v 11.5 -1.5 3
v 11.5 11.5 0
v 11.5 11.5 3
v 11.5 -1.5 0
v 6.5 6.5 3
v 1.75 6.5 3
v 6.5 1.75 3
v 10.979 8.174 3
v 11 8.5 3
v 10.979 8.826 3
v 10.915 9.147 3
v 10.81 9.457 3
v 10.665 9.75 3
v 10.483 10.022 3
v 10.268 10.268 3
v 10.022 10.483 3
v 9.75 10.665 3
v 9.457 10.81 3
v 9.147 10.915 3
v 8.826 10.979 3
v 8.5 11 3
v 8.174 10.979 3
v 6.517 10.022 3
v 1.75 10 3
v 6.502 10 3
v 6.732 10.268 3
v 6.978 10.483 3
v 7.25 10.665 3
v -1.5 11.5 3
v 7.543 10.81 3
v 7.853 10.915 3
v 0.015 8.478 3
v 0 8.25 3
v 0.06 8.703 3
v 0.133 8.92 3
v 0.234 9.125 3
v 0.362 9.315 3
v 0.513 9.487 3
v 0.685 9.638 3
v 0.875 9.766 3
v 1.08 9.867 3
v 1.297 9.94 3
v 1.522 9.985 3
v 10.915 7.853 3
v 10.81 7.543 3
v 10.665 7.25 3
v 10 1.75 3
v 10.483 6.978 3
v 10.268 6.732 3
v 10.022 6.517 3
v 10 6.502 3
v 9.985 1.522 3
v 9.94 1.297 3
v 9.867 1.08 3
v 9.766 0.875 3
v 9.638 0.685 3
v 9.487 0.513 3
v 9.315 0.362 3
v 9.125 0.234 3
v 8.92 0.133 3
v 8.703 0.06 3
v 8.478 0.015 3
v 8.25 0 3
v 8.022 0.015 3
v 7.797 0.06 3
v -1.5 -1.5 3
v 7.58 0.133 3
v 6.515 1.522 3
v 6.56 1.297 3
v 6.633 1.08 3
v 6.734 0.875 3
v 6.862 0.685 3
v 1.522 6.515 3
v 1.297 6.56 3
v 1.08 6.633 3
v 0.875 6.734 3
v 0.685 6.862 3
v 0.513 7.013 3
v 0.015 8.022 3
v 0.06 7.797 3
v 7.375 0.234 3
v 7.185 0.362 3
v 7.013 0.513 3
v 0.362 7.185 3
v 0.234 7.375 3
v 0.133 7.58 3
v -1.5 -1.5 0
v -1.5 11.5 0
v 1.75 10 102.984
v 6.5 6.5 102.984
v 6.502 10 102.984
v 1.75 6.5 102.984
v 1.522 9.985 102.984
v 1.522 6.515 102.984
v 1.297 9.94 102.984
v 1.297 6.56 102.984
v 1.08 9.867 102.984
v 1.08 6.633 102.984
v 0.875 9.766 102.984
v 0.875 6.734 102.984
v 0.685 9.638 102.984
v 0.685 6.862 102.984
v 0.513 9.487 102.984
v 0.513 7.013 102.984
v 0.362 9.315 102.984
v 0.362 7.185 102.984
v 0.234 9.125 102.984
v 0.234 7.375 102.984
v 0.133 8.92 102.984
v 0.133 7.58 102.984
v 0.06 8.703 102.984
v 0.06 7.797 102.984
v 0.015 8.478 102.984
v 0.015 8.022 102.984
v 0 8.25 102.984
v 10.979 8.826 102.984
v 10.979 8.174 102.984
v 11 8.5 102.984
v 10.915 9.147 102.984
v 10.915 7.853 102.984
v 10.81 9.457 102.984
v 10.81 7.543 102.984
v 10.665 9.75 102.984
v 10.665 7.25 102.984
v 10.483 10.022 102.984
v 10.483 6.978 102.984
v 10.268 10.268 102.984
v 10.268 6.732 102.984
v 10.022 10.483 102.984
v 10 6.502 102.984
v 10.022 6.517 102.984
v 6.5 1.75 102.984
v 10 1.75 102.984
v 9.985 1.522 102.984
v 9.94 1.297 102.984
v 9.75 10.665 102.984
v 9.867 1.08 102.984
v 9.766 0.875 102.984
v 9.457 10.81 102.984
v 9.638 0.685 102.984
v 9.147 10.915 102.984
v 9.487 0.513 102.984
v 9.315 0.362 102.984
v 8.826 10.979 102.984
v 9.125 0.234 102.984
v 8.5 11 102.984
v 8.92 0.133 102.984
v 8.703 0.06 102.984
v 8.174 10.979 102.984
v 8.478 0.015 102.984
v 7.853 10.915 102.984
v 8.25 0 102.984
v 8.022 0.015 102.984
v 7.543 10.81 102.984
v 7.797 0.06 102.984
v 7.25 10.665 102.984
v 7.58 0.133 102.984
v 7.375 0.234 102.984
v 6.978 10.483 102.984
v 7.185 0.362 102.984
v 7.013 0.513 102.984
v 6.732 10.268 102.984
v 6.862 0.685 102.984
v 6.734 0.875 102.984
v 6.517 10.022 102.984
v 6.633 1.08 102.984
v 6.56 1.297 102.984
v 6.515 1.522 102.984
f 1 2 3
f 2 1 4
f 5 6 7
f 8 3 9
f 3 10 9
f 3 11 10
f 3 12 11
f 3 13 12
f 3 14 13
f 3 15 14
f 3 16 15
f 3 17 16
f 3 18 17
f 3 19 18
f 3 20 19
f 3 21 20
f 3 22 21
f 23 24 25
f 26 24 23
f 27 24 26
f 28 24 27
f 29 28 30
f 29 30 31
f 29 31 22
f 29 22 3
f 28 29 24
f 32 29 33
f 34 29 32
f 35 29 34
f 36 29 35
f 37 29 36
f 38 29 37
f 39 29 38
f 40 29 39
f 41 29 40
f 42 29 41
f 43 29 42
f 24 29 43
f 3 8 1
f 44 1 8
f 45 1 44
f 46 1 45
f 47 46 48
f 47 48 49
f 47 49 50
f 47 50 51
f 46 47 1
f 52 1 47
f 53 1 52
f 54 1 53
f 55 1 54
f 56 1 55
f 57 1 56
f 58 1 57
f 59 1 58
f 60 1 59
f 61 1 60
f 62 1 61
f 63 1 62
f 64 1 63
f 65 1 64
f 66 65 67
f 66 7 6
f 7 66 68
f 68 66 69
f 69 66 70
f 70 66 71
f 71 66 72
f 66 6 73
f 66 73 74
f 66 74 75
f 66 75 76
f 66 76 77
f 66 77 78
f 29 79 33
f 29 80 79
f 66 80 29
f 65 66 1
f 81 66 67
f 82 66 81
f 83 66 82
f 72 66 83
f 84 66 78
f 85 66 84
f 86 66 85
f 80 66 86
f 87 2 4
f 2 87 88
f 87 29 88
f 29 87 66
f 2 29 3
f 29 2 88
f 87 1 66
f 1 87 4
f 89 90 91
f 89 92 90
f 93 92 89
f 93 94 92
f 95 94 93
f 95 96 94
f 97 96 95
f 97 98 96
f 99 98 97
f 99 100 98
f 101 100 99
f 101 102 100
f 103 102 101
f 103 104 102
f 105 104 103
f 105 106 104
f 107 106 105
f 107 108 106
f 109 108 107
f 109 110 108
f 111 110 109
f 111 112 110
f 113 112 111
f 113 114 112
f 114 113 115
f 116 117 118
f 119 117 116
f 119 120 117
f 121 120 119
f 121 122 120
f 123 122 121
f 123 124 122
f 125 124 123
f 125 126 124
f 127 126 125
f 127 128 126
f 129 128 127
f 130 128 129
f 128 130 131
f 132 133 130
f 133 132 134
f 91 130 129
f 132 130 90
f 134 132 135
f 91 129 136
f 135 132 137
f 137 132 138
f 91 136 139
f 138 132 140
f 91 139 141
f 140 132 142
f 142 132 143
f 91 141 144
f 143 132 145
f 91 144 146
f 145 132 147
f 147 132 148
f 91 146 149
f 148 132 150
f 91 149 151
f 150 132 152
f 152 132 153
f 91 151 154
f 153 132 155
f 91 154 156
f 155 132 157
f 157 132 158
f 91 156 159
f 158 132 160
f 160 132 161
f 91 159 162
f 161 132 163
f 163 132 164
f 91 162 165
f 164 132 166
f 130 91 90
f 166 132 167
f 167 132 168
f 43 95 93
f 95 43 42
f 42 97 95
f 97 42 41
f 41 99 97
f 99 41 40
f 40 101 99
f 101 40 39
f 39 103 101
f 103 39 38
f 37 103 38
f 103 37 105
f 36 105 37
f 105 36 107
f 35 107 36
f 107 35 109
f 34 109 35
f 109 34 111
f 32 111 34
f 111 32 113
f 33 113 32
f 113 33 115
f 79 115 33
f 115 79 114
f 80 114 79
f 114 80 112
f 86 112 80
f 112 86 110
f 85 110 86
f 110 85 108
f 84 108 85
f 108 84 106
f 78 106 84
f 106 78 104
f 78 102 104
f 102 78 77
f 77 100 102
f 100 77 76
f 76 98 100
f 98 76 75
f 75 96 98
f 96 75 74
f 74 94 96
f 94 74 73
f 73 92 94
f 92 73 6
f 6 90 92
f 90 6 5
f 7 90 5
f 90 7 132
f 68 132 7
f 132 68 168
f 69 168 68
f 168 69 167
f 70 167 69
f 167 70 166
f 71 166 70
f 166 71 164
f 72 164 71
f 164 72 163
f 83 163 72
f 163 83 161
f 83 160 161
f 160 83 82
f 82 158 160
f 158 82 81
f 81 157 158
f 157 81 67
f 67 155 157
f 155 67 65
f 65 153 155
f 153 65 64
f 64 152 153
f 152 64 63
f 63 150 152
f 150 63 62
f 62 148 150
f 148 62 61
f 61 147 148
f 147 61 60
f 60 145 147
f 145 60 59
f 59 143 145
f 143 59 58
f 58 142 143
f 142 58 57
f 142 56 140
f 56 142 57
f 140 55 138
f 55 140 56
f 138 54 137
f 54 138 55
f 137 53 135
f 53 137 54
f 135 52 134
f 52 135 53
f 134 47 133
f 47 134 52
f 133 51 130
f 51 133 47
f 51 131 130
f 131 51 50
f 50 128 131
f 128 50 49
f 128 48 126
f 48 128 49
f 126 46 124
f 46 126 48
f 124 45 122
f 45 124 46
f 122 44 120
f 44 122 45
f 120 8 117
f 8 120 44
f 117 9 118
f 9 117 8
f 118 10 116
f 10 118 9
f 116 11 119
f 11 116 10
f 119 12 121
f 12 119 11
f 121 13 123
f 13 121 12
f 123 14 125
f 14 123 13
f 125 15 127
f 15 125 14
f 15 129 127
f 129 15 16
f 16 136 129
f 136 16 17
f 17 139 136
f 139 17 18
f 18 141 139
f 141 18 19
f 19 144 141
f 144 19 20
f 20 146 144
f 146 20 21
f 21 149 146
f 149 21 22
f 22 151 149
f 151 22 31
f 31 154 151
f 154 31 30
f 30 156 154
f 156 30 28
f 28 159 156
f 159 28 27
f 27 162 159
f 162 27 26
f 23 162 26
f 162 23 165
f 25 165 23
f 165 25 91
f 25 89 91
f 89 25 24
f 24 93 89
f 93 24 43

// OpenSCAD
e = 1/64;

slot_width = 4.0;
L_leg_length = 11; // possibly 12
extent_length = 14.0;

center_diameter = 8.5;


module ridge_outline () {

  both_inset = 0.5;
  inset = both_inset / 2;
  ridge_width = slot_width - 0.5;
  half_ridge_width = ridge_width / 2;

  L_vert_to_horiz_start = 6.5; // measured is 7.0

  ridge_center_radius = 5.0 / 2;

  rotate([0, 0, 180])
  union () {
    square([ridge_width, L_vert_to_horiz_start + half_ridge_width]);
    translate([half_ridge_width, L_vert_to_horiz_start + half_ridge_width]) {
      circle(d = ridge_width, $fn = 48);
    }

    square([L_vert_to_horiz_start + half_ridge_width, ridge_width]);
    translate([L_vert_to_horiz_start + half_ridge_width, half_ridge_width]) {
      circle(d = ridge_width, $fn = 48);
    }

    translate([-(ridge_center_radius - ridge_width) + both_inset,
               -(ridge_center_radius - ridge_width) + both_inset]) {
      circle(r = ridge_center_radius, $fn = 48);
    }
  }
}

module generate_ridge (height = 2.0 + 1.5) {

  linear_extrude(h = height) {
    ridge_outline();
  }

}


if (!true) {
  //ridge_outline();
  generate_ridge(height = 2.0 + 1.5 + 0.5);
 } else {

  h = 3;
  translate ([-3/2,-3/2,0]) cube([10 + 3, 10 + 3, h]);
  translate ([10, 10, h-e]) { generate_ridge(height = 2.0 + 1.5 + 0.5); }

 }
